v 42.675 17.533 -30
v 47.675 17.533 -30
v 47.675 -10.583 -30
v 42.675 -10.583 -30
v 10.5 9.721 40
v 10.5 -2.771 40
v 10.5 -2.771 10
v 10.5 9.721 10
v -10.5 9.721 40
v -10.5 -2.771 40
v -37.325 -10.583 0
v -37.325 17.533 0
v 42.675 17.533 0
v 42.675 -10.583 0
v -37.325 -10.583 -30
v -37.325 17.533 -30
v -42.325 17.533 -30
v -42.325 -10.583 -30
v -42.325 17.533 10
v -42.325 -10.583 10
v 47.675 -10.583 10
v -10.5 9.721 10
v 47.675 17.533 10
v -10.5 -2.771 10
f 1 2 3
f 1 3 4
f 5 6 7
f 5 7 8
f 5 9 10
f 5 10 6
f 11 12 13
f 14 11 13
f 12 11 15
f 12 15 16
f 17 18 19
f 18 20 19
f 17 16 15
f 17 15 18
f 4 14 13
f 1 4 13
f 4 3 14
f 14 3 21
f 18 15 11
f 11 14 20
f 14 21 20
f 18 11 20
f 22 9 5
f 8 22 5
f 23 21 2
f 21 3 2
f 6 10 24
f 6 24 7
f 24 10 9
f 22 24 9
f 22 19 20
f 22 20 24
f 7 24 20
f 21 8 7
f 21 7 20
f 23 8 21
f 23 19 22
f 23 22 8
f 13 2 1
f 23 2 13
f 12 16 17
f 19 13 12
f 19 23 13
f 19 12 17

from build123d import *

# Parameters (mm, degrees)
SKETCH_1_W      = 90
SKETCH_1_H      = 28.115702479
EXTRUDE_1_DEPTH = 10
SKETCH_2_W      = 20.999219252
SKETCH_2_H      = 12.492407229
EXTRUDE_2_DEPTH = 30
SKETCH_3_W      = 5
SKETCH_3_H      = 28.115702479
EXTRUDE_3_DEPTH = 30


with BuildPart() as part:
    # 草图1 → 凸台-拉伸1 (new body)
    with BuildSketch(Plane.XY):
        with Locations((2.674645003, 3.474778593)):
            Rectangle(SKETCH_1_W, SKETCH_1_H)
    extrude(amount=EXTRUDE_1_DEPTH)

    # 草图2 → 凸台-拉伸2 (add)
    with BuildSketch(Plane.XY.offset(10)):
        with Locations((0, 3.474778592)):
            Rectangle(SKETCH_2_W, SKETCH_2_H)
    extrude(amount=EXTRUDE_2_DEPTH)

    # 草图3 → 凸台-拉伸3 (add)
    with BuildSketch(Plane(origin=(0, 0, 0), x_dir=(-1, 0, 0), z_dir=(0, 0, -1))):
        with Locations((39.825354997, 3.474778593)):
            Rectangle(SKETCH_3_W, SKETCH_3_H)
        with Locations((-45.174645003, 3.474778593)):
            Rectangle(SKETCH_3_W, SKETCH_3_H)
    extrude(amount=EXTRUDE_3_DEPTH)


solid = part.part
